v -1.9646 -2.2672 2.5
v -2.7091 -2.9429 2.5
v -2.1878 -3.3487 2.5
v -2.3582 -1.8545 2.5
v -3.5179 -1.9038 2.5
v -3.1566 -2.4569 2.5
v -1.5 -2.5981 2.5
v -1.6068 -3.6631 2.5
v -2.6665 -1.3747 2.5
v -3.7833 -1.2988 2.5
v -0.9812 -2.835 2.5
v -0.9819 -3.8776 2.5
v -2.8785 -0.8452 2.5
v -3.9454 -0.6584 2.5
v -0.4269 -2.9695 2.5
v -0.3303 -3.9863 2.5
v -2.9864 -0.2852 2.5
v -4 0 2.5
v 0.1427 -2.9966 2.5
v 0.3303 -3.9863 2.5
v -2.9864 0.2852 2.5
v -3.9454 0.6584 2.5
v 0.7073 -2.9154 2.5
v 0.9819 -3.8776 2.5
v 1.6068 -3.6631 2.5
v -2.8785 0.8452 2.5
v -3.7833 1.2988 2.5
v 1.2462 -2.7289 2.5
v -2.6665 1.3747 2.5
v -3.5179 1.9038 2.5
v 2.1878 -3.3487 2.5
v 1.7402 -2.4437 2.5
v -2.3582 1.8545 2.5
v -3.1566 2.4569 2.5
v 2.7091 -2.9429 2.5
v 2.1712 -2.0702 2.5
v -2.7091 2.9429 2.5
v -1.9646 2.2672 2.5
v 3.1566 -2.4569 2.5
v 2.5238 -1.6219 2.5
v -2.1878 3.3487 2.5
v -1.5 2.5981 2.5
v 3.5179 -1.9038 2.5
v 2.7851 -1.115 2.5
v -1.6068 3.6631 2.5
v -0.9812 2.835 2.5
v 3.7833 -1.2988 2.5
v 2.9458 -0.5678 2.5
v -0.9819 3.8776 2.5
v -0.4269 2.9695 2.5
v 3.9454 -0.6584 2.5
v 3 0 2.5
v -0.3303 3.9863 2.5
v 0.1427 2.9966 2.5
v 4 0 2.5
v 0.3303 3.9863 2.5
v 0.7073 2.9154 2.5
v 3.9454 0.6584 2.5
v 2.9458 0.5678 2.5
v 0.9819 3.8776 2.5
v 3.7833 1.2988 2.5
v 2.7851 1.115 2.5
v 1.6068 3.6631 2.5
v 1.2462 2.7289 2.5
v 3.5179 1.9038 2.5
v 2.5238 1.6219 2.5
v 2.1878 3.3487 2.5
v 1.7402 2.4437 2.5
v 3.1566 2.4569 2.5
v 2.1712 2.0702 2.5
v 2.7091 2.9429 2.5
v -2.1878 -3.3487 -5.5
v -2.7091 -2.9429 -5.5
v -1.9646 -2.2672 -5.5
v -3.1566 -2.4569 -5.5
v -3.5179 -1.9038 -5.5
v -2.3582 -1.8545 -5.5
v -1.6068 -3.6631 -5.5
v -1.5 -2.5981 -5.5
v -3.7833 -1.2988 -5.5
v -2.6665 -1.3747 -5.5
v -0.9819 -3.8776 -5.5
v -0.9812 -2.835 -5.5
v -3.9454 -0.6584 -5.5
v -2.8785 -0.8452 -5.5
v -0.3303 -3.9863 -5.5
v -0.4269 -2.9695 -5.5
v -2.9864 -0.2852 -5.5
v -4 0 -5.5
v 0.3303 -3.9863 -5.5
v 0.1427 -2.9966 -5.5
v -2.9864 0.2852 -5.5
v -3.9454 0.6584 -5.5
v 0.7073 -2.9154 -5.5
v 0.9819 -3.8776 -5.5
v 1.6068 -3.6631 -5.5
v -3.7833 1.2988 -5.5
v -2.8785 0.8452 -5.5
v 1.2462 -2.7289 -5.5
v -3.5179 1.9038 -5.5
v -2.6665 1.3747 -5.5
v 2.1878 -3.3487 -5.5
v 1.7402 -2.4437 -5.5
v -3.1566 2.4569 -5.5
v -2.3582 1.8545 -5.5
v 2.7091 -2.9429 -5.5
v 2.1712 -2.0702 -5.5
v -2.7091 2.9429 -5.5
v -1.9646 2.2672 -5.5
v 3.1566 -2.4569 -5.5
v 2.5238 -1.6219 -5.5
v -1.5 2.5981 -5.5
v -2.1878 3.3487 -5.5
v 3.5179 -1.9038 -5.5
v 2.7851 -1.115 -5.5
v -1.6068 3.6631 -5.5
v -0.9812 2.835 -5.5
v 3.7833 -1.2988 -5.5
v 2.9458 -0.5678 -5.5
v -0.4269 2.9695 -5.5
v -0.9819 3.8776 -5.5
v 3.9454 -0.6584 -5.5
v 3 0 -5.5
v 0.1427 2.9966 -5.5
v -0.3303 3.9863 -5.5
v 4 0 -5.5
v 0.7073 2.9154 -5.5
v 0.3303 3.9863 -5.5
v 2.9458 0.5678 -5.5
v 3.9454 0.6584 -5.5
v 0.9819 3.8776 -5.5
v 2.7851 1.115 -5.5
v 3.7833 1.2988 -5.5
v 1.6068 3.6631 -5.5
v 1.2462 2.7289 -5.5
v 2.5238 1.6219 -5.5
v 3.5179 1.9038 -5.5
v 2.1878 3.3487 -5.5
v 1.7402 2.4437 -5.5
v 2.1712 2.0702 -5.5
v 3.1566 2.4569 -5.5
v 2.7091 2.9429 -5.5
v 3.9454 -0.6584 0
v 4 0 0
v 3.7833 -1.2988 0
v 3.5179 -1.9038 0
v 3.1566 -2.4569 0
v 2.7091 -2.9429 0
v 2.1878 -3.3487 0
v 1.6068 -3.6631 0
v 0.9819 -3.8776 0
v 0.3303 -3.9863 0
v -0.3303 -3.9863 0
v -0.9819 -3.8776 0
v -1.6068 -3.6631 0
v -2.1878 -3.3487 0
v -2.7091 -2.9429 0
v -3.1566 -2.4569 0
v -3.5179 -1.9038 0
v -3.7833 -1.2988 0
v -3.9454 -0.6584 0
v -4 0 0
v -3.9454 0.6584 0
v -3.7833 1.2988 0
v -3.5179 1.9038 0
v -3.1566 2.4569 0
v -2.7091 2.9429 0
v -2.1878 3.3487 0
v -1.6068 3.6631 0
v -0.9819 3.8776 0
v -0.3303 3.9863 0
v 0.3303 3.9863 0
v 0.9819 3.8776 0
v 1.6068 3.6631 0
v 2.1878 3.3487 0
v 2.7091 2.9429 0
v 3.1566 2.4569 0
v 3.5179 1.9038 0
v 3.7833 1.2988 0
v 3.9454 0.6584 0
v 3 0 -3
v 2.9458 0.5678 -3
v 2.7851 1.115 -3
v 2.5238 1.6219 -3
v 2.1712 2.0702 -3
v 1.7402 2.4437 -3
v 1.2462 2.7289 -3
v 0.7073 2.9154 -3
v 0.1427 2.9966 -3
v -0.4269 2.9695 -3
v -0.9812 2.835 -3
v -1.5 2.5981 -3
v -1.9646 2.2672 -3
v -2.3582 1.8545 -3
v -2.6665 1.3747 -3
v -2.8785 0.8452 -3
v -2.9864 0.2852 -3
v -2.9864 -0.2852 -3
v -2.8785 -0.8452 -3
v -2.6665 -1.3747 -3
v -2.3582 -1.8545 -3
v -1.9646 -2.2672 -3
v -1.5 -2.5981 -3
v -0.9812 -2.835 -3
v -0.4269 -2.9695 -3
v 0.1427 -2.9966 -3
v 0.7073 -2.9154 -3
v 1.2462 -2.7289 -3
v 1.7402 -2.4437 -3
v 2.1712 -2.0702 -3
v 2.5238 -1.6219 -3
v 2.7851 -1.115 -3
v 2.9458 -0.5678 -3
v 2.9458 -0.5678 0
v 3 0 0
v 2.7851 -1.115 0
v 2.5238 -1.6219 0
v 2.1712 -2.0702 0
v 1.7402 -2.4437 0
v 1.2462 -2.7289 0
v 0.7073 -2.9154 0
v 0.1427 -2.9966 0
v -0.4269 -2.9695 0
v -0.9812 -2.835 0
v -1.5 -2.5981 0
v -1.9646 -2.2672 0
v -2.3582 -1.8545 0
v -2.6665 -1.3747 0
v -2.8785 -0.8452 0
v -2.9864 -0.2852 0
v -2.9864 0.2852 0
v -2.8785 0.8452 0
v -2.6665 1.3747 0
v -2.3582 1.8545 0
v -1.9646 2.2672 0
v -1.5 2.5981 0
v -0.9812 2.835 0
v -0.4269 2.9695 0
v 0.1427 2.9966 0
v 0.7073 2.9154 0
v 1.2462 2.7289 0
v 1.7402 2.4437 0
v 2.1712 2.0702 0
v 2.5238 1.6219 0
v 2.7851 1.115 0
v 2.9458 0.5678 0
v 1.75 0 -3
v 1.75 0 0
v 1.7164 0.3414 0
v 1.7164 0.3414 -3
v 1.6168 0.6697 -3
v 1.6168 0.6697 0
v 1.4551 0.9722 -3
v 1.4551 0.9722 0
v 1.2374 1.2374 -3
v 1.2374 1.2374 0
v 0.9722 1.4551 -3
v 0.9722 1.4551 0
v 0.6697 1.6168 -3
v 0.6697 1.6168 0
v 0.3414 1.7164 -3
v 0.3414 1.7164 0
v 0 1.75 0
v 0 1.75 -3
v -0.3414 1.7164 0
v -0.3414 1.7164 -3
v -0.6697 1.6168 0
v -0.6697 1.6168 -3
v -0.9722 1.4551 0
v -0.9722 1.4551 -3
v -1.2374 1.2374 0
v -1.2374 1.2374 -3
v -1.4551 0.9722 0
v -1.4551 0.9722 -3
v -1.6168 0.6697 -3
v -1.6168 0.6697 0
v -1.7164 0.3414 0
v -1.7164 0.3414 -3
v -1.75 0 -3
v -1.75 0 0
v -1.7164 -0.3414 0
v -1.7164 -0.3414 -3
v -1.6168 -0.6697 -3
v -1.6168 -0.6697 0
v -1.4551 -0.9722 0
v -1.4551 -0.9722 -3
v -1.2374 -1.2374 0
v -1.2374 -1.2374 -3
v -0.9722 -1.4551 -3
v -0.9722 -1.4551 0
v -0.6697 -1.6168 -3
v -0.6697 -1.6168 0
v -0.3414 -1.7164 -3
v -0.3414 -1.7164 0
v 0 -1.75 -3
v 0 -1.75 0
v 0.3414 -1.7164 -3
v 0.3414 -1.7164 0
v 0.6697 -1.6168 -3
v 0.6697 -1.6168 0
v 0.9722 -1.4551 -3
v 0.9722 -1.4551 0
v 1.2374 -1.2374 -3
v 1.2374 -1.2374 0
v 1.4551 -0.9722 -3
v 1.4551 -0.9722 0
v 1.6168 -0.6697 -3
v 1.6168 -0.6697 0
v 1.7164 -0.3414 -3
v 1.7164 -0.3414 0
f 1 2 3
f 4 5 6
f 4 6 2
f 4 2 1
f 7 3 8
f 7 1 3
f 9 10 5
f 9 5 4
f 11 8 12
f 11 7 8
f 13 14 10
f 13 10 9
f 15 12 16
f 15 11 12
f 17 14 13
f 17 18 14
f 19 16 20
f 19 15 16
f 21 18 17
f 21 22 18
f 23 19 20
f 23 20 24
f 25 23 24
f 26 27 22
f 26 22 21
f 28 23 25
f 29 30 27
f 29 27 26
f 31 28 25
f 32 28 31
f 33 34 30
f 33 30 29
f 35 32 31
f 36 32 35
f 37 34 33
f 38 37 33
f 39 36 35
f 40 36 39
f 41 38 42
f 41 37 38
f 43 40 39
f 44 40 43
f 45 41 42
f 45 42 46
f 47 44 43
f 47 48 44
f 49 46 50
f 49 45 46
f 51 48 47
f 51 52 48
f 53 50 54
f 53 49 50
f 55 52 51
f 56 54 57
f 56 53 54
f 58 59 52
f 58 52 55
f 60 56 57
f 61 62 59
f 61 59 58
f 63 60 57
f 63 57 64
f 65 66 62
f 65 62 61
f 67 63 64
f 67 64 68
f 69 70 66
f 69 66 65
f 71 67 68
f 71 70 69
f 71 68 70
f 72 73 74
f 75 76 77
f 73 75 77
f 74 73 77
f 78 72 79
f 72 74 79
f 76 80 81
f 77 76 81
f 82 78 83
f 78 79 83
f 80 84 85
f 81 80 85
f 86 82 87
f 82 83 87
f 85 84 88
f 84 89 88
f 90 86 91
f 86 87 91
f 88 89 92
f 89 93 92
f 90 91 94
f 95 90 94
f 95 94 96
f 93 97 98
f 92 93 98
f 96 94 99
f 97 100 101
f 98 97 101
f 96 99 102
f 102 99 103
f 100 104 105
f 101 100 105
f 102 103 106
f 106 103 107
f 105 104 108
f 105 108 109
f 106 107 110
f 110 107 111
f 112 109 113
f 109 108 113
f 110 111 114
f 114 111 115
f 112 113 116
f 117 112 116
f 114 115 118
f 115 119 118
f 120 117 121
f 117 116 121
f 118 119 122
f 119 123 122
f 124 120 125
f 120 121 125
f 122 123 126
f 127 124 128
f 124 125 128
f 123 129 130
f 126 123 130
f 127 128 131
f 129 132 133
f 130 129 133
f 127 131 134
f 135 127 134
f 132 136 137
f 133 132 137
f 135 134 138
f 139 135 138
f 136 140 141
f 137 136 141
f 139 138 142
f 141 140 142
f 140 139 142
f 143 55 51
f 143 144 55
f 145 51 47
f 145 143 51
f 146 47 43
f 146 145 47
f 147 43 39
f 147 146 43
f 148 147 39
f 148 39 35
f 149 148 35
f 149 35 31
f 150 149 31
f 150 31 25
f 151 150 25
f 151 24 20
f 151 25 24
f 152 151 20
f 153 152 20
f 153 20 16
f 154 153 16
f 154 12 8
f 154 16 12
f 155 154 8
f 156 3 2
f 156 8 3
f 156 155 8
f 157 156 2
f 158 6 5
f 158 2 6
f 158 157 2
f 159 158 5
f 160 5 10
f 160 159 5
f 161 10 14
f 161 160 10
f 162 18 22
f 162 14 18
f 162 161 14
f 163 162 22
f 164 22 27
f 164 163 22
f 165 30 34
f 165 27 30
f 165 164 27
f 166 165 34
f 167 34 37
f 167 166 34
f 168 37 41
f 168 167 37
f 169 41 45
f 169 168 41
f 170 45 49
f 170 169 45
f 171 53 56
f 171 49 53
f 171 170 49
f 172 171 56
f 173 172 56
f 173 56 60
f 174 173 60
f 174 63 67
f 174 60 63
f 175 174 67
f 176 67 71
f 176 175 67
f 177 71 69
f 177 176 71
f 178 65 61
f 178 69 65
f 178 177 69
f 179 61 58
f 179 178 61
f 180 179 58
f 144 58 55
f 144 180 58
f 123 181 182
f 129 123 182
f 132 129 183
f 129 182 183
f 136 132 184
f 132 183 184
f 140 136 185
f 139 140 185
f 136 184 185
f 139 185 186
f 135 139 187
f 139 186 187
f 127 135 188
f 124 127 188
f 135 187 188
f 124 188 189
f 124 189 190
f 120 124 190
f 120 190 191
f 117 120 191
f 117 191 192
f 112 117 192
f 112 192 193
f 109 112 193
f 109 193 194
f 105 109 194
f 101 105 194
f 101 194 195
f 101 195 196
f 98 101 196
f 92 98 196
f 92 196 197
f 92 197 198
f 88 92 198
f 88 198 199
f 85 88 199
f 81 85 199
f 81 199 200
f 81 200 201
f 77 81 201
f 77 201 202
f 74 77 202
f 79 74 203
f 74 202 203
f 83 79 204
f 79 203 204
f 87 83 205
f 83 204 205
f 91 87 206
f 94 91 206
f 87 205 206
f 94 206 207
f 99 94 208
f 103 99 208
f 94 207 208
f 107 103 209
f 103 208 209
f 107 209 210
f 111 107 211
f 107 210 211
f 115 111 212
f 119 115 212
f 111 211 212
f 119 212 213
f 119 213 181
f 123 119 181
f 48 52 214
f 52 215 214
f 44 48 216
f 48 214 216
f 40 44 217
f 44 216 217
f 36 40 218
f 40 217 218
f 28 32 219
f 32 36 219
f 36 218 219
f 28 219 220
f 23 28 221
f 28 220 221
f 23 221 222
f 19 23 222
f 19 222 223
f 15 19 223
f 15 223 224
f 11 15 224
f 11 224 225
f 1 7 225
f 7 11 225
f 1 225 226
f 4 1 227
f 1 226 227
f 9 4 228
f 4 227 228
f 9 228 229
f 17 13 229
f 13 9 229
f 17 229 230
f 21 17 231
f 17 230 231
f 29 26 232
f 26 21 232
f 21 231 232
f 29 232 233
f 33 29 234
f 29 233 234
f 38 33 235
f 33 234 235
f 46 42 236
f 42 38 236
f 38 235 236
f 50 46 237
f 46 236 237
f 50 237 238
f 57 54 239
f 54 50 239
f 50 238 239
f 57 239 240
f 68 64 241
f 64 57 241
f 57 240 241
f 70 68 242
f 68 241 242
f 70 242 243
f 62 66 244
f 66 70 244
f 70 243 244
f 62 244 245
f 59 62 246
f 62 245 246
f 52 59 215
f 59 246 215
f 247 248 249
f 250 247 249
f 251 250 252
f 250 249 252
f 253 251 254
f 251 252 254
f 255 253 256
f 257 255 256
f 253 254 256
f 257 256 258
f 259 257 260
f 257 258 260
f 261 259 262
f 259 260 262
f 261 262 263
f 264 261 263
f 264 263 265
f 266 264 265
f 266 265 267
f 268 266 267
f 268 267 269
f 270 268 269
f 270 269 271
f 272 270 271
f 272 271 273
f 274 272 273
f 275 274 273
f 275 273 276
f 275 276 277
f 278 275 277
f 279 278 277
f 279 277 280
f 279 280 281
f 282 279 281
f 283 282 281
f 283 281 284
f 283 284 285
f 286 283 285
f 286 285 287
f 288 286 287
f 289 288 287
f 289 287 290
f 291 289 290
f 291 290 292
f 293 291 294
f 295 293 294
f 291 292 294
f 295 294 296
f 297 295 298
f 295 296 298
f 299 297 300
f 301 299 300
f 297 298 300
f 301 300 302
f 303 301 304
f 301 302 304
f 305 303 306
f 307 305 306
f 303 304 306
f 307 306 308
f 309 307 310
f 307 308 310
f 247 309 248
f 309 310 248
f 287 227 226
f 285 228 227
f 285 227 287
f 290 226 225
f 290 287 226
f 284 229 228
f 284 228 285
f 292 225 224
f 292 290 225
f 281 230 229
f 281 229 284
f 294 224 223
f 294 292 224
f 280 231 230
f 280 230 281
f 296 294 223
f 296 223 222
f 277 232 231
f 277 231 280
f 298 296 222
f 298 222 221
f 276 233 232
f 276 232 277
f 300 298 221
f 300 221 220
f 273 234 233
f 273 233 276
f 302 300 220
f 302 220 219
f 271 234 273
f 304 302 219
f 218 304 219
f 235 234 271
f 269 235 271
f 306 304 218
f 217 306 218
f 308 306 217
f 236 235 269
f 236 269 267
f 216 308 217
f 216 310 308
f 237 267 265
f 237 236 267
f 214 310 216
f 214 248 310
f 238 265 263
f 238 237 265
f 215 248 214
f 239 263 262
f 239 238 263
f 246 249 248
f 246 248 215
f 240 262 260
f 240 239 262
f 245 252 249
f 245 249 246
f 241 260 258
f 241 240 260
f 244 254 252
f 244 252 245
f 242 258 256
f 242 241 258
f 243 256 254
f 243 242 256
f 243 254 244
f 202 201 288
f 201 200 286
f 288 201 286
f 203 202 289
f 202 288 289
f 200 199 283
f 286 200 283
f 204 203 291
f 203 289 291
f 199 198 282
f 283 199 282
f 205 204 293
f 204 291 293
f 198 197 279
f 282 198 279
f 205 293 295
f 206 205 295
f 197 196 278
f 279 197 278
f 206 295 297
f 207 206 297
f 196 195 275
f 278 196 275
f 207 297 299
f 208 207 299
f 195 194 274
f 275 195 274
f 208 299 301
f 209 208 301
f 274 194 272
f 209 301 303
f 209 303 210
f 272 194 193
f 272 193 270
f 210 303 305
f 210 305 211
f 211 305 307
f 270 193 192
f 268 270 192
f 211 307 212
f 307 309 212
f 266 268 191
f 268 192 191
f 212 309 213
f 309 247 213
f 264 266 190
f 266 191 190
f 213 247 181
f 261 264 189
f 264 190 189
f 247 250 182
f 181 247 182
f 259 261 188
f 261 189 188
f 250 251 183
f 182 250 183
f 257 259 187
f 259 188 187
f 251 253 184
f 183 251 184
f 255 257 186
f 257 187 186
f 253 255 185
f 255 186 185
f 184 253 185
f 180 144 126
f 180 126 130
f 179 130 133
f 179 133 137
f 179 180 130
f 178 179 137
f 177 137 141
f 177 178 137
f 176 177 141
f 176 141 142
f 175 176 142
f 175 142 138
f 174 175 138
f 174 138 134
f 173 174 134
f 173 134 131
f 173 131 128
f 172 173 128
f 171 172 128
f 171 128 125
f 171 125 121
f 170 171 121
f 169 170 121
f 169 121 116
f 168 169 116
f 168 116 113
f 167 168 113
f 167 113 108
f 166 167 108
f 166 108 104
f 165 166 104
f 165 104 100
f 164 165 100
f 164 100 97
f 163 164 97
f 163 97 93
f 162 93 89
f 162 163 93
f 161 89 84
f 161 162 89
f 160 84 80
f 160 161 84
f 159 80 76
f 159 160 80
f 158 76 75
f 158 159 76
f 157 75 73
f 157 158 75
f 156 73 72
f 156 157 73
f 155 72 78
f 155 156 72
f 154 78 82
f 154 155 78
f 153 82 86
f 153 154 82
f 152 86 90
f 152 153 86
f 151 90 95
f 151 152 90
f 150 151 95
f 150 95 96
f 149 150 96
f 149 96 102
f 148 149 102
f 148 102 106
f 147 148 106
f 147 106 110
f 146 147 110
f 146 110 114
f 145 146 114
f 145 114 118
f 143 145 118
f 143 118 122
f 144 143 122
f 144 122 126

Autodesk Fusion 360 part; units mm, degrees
sketch "Sketch1" plane through (0, 0, 0) normal (0, 0, 1) x (1, 0, 0)
  circle A0 centre (0, 0) radius 1.75
  circle A1 centre (0, 0) radius 3
  circle A2 centre (0, 0) radius 4
  dimension "d1" = 3.5
  dimension "d2" = 6
  dimension "d3" = 8
extrude "Extrude1" add sketch "Sketch1" against normal blind 3 contours A1
extrude "Extrude2" add sketch "Sketch1" along normal blind 2.5 and the other way blind 5.5 contours A2
